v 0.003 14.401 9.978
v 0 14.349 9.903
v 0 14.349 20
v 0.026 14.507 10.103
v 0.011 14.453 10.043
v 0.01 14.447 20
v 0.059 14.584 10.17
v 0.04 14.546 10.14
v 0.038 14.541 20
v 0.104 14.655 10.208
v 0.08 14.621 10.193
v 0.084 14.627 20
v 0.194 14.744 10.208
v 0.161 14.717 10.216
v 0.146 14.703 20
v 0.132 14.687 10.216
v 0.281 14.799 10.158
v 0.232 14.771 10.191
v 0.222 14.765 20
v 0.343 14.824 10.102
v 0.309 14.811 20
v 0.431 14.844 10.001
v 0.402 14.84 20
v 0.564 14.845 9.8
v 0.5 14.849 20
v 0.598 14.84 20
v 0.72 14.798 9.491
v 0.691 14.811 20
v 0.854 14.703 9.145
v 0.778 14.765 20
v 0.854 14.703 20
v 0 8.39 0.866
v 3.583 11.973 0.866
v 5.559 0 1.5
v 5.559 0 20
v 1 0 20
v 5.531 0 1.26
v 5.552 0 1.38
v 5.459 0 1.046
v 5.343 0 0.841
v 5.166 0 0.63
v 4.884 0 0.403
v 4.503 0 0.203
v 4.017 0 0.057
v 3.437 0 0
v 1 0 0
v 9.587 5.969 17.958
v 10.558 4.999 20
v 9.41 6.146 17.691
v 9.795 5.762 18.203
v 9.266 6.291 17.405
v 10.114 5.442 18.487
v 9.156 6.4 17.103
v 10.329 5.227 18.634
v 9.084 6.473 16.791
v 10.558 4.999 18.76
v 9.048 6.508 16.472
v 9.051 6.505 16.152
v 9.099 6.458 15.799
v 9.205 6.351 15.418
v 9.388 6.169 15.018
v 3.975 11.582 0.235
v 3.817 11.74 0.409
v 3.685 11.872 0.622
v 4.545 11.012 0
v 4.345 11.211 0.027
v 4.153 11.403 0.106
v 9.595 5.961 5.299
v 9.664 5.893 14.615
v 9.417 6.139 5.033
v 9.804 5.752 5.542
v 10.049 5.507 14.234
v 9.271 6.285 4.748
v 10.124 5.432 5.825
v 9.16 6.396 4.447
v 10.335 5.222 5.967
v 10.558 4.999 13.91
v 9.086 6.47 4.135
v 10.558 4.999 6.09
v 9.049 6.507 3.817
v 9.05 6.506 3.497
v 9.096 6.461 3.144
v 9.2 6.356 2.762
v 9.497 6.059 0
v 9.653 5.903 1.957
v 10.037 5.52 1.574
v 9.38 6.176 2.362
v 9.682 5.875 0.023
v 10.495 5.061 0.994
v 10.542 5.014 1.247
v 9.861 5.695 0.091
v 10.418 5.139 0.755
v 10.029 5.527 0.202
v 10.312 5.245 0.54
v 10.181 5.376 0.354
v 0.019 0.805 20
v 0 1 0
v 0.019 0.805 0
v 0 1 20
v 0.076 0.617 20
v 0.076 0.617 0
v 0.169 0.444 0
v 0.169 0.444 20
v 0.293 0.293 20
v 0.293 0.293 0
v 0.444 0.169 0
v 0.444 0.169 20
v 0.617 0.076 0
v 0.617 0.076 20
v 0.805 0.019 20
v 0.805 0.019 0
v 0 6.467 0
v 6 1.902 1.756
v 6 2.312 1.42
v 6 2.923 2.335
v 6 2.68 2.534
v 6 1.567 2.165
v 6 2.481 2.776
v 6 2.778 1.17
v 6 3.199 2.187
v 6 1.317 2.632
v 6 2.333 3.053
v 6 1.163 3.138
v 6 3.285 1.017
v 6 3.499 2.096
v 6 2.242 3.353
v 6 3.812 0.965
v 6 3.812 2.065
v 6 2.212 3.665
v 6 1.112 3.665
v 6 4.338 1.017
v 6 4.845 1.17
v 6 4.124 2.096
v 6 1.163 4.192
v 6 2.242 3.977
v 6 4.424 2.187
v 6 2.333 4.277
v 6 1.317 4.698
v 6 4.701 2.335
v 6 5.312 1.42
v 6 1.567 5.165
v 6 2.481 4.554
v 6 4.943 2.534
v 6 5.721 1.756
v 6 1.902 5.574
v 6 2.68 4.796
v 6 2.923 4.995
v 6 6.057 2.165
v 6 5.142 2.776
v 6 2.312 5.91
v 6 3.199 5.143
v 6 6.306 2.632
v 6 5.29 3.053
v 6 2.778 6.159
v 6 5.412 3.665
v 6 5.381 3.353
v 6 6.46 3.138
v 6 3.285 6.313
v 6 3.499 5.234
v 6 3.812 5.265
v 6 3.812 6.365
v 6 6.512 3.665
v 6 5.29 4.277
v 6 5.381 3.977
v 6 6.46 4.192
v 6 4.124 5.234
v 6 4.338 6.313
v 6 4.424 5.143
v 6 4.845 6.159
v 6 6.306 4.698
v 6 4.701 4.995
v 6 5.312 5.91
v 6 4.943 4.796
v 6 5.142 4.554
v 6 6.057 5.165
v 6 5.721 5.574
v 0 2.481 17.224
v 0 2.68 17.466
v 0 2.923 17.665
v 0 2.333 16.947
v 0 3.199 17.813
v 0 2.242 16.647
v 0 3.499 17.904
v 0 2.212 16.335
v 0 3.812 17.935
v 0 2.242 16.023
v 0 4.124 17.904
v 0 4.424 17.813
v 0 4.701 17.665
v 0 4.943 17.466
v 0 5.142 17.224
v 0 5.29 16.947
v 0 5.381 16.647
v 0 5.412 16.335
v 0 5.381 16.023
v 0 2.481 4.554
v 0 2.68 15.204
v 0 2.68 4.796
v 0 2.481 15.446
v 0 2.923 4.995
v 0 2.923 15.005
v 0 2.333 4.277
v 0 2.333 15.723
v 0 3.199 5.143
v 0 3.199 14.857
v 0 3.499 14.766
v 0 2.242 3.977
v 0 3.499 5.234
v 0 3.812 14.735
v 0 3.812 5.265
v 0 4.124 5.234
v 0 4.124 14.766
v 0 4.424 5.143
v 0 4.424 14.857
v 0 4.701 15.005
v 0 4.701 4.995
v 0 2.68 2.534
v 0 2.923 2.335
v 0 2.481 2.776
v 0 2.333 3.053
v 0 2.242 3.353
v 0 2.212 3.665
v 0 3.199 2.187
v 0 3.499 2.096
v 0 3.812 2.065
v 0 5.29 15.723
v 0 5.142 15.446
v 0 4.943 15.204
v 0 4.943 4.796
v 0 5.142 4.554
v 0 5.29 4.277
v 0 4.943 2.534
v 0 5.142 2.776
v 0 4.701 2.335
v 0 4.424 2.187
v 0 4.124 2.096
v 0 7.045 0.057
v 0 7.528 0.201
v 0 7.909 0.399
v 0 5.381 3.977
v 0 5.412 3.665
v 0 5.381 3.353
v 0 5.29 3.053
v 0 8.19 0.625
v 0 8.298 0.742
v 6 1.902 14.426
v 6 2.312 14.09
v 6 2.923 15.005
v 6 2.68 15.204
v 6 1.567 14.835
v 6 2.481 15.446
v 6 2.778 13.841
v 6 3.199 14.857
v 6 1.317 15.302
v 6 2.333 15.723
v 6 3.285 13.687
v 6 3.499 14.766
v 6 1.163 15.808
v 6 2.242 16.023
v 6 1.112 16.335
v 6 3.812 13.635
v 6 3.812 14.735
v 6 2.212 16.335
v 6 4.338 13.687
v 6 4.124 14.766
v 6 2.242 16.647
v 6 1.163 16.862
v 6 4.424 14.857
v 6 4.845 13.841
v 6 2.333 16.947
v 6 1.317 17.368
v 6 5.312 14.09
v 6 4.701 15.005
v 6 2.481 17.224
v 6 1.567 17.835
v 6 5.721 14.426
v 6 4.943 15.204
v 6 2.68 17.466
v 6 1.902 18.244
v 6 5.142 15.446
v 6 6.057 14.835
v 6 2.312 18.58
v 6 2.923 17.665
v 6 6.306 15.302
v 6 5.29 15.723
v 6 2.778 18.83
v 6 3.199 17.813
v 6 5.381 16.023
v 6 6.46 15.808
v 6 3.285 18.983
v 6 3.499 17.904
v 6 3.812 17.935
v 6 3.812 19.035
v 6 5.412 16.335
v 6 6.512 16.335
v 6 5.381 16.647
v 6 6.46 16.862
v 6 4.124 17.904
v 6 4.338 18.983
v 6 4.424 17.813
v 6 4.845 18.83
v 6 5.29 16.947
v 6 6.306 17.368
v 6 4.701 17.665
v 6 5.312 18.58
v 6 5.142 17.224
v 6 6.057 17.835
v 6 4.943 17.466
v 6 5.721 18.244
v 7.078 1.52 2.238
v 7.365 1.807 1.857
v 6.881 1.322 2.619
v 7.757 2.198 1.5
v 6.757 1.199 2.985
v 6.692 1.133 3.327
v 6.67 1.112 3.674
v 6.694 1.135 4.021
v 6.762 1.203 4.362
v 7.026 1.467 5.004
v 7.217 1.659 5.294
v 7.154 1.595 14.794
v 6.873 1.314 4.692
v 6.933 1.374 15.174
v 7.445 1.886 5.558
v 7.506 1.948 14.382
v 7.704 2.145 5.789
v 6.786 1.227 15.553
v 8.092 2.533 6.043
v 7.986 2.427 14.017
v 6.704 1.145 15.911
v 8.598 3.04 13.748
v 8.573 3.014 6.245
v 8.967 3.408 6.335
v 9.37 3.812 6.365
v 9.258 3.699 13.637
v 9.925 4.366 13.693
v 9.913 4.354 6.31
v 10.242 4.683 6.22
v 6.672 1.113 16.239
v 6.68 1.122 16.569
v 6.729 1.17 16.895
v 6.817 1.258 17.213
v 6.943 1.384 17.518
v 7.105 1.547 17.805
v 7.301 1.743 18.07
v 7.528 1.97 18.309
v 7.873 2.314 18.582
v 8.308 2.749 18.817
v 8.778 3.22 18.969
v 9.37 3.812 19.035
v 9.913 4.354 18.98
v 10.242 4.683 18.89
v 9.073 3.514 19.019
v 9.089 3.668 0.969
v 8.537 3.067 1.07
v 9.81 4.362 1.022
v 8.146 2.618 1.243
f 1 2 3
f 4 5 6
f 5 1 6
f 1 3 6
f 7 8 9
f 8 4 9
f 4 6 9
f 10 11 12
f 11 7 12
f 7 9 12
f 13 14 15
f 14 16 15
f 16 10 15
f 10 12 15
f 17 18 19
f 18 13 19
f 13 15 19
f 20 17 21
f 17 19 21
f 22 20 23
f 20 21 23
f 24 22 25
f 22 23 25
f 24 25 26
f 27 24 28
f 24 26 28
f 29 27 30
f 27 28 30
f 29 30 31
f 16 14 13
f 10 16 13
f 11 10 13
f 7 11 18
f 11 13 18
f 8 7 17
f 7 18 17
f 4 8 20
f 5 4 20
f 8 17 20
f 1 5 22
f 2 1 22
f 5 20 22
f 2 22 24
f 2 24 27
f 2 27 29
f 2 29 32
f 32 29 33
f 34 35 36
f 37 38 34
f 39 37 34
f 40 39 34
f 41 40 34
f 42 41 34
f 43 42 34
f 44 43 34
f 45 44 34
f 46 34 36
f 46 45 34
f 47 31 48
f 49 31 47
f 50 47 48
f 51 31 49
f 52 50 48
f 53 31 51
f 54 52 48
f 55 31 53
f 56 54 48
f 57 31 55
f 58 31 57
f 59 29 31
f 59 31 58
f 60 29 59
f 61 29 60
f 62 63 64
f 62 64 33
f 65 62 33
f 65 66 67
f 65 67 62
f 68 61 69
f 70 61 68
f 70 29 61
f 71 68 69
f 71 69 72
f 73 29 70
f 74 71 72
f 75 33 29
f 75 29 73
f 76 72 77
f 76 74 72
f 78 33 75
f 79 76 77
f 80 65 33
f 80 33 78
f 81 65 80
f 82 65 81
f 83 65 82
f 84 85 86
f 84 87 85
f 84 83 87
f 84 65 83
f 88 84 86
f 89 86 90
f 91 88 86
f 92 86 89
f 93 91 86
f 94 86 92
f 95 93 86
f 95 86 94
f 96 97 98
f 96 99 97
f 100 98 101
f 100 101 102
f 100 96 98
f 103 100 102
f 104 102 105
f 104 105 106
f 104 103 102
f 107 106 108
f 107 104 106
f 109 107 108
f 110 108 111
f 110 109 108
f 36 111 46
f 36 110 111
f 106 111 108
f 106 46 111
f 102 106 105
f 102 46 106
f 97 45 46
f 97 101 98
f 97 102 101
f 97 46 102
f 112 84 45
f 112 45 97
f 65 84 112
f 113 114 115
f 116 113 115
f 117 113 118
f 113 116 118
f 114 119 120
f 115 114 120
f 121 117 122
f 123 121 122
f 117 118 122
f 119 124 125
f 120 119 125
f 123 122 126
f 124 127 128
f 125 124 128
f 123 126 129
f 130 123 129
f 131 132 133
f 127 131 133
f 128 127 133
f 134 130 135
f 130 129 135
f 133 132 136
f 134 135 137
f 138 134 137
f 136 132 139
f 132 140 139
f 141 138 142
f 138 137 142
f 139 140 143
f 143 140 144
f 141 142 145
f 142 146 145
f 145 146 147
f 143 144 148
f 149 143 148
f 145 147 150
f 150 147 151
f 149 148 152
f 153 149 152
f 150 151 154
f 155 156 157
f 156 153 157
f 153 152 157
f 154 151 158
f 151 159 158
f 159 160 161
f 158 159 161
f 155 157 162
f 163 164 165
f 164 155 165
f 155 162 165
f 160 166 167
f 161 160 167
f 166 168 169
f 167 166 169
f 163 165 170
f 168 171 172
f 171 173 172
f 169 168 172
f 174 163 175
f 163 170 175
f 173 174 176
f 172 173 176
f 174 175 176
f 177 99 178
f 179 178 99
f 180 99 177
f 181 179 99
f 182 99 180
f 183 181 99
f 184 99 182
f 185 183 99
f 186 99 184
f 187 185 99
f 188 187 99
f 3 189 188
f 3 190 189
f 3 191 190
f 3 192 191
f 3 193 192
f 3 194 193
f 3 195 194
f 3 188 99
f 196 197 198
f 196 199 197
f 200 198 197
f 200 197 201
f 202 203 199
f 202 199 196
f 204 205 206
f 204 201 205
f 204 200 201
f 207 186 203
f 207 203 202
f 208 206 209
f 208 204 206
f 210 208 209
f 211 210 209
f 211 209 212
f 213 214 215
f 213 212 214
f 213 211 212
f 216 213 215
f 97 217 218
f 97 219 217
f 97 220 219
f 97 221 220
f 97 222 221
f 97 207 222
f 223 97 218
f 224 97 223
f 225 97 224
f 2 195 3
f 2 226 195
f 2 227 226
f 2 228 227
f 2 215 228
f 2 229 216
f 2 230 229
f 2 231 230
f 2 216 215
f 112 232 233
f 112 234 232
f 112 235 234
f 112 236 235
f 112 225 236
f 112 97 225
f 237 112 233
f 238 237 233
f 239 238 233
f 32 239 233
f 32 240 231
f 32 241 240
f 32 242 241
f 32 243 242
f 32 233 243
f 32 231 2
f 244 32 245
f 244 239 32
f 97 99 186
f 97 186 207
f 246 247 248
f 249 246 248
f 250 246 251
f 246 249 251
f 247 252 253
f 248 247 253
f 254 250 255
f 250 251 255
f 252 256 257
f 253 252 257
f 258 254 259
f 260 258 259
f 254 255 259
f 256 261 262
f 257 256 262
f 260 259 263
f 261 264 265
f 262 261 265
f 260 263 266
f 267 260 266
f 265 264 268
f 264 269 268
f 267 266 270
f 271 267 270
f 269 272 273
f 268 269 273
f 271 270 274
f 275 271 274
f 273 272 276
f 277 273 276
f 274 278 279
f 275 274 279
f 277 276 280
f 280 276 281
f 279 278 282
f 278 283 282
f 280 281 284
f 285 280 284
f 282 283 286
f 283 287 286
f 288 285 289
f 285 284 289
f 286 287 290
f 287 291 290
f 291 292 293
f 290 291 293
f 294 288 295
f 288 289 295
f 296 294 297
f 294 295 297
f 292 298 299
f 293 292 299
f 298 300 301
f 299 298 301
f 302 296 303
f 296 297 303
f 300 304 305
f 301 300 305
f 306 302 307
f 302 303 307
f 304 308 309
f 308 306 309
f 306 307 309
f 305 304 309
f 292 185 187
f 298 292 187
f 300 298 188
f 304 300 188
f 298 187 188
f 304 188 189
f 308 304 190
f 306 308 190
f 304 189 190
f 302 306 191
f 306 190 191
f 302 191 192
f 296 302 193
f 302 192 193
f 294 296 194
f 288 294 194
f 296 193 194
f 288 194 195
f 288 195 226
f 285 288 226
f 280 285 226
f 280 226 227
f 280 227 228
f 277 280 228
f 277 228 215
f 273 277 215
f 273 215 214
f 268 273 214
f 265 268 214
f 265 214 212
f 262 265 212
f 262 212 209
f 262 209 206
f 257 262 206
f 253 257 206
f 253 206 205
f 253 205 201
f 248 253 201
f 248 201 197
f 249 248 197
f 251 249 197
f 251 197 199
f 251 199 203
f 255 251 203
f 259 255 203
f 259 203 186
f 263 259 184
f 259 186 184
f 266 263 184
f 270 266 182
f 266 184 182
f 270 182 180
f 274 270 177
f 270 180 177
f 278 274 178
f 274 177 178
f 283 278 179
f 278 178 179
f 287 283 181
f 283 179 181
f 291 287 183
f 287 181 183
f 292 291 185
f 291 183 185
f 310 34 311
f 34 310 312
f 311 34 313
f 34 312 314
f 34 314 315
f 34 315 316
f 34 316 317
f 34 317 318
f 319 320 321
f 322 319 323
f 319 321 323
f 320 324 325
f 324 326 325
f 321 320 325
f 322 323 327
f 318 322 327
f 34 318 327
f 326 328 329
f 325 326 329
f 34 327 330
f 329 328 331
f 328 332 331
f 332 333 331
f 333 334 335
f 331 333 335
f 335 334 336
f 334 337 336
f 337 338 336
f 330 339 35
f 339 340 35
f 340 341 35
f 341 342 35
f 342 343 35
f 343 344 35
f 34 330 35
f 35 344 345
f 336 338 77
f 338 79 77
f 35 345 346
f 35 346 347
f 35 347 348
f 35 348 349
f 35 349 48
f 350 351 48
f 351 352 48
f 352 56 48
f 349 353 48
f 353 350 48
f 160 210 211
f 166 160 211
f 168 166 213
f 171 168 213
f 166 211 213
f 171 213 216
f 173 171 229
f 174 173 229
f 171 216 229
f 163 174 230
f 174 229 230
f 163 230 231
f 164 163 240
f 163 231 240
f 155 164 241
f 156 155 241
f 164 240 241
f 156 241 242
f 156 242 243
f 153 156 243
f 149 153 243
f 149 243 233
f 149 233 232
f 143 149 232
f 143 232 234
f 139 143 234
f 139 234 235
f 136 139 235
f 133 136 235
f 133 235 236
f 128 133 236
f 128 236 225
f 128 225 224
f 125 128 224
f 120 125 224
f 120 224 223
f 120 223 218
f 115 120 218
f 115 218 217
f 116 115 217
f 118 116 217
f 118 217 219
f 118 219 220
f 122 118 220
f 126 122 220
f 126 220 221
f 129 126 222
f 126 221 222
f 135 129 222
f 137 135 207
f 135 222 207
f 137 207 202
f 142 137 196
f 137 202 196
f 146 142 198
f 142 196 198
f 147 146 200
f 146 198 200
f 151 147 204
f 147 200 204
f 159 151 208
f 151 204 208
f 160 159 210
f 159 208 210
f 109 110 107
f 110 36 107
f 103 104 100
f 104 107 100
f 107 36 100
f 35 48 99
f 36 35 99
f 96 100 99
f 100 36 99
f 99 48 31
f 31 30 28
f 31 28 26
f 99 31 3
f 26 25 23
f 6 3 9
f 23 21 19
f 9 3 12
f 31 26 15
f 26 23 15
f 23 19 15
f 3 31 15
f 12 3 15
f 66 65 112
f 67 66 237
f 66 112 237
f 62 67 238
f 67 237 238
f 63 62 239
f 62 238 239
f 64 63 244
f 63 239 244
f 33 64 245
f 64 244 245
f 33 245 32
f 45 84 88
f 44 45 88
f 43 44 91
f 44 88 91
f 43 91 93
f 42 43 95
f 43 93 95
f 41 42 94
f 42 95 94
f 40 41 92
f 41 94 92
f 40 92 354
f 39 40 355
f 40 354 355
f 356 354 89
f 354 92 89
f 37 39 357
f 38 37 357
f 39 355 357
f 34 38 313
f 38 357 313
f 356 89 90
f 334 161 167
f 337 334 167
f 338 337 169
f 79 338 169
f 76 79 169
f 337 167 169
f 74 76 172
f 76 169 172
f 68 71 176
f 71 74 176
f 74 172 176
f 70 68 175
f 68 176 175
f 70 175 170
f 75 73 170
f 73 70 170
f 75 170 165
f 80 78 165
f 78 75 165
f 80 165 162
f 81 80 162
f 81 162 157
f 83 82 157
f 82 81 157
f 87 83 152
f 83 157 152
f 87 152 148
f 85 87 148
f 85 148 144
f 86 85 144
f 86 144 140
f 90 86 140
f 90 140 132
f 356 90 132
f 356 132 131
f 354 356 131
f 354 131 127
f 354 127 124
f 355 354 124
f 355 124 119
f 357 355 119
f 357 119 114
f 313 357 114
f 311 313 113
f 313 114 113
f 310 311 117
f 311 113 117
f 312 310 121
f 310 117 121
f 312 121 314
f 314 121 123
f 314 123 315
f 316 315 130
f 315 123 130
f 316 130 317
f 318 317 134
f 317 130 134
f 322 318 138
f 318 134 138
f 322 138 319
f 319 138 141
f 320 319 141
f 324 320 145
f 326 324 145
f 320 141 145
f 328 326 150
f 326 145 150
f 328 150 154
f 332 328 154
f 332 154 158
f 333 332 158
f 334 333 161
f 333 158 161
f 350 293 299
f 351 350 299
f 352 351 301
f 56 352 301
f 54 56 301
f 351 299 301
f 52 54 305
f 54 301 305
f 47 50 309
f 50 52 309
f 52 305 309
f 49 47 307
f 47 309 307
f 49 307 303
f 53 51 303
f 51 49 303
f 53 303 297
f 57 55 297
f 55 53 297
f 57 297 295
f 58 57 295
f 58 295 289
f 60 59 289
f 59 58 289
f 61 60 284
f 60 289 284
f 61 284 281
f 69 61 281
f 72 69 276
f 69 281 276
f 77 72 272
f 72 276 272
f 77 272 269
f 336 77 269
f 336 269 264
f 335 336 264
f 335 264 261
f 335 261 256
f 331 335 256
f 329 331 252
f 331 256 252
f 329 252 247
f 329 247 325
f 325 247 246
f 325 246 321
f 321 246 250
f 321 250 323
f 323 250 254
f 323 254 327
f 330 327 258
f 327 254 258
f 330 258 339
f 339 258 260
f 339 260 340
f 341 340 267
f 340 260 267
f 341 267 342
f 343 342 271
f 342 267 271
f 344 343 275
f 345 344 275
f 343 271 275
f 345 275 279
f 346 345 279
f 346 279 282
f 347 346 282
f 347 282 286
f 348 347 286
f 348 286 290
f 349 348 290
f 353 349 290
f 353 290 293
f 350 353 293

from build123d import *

# Parameters (mm, degrees)
BOSS_EXTRUDE1_DEPTH = 20
SKETCH6_R           = 1.6
CUT_EXTRUDE4_DEPTH  = 16.556349186
SKETCH7_R           = 2.7
CUT_EXTRUDE5_DEPTH  = 10.556349186
FILLET4_R           = 1
FILLET5_R           = 0.5
CUT_EXTRUDE6_DEPTH  = 10
CUT_EXTRUDE7_DEPTH  = 10
FILLET6_R           = 1.5


with BuildPart() as part:
    # Sketch1 → Boss-Extrude1 (new body)
    with BuildSketch(Plane.XY):
        Polygon((0, 0), (0, 15.556349186), (15.556349186, 0), align=None)
    extrude(amount=BOSS_EXTRUDE1_DEPTH)

    # Sketch6 → Cut-Extrude4 (cut, through all)
    with BuildSketch(Plane.ZY):
        with Locations((16.335044769, 3.811593223)):
            Circle(SKETCH6_R)
        with Locations((3.664955231, 3.811593223)):
            Circle(SKETCH6_R)
    extrude(amount=-CUT_EXTRUDE4_DEPTH, mode=Mode.SUBTRACT)

    # Sketch7 → Cut-Extrude5 (cut, through all)
    with BuildSketch(Plane.ZY.offset(-6)):
        with Locations((16.335044769, 3.811593223)):
            Circle(SKETCH7_R)
        with Locations((3.664955231, 3.811593223)):
            Circle(SKETCH7_R)
    extrude(amount=-CUT_EXTRUDE5_DEPTH, mode=Mode.SUBTRACT)

    # Fillet4
    fillet4_edges = [part.edges().sort_by_distance(p)[0] for p in [
        (0, 0, 10),
    ]]
    fillet(fillet4_edges, radius=FILLET4_R)

    # Fillet5
    fillet5_edges = [part.edges().sort_by_distance(p)[0] for p in [
        (0, 15.556349186, 10),
        (15.556349186, 0, 10),
    ]]
    fillet(fillet5_edges, radius=FILLET5_R)

    # Sketch8 → Cut-Extrude6 (cut)
    with BuildSketch(Plane(origin=(7.778174593, 7.778174593, 0), x_dir=(0, 0, -1), z_dir=(0.707106781, 0.707106781, 0))):
        Polygon((-20, -12.333051339), (0, -12.333051339), (0.012190886, -3.93058749), (-20, -3.93058749), align=None)
    extrude(amount=-CUT_EXTRUDE6_DEPTH, mode=Mode.SUBTRACT)

    # Sketch9 → Cut-Extrude7 (cut)
    with BuildSketch(Plane(origin=(7.778174593, 7.778174593, 0), x_dir=(0, 0, -1), z_dir=(0.707106781, 0.707106781, 0))):
        Polygon((-11.323221056, 10.808771842), (0, 5.528667149), (0, 10.808771842), align=None)
    extrude(amount=-CUT_EXTRUDE7_DEPTH, mode=Mode.SUBTRACT)

    # Fillet6
    fillet6_edges = [part.edges().sort_by_distance(p)[0] for p in [
        (8.058104899, 2.499414762, 0),
        (1.934408281, 9.753124344, 0),
    ]]
    fillet(fillet6_edges, radius=FILLET6_R)


solid = part.part
